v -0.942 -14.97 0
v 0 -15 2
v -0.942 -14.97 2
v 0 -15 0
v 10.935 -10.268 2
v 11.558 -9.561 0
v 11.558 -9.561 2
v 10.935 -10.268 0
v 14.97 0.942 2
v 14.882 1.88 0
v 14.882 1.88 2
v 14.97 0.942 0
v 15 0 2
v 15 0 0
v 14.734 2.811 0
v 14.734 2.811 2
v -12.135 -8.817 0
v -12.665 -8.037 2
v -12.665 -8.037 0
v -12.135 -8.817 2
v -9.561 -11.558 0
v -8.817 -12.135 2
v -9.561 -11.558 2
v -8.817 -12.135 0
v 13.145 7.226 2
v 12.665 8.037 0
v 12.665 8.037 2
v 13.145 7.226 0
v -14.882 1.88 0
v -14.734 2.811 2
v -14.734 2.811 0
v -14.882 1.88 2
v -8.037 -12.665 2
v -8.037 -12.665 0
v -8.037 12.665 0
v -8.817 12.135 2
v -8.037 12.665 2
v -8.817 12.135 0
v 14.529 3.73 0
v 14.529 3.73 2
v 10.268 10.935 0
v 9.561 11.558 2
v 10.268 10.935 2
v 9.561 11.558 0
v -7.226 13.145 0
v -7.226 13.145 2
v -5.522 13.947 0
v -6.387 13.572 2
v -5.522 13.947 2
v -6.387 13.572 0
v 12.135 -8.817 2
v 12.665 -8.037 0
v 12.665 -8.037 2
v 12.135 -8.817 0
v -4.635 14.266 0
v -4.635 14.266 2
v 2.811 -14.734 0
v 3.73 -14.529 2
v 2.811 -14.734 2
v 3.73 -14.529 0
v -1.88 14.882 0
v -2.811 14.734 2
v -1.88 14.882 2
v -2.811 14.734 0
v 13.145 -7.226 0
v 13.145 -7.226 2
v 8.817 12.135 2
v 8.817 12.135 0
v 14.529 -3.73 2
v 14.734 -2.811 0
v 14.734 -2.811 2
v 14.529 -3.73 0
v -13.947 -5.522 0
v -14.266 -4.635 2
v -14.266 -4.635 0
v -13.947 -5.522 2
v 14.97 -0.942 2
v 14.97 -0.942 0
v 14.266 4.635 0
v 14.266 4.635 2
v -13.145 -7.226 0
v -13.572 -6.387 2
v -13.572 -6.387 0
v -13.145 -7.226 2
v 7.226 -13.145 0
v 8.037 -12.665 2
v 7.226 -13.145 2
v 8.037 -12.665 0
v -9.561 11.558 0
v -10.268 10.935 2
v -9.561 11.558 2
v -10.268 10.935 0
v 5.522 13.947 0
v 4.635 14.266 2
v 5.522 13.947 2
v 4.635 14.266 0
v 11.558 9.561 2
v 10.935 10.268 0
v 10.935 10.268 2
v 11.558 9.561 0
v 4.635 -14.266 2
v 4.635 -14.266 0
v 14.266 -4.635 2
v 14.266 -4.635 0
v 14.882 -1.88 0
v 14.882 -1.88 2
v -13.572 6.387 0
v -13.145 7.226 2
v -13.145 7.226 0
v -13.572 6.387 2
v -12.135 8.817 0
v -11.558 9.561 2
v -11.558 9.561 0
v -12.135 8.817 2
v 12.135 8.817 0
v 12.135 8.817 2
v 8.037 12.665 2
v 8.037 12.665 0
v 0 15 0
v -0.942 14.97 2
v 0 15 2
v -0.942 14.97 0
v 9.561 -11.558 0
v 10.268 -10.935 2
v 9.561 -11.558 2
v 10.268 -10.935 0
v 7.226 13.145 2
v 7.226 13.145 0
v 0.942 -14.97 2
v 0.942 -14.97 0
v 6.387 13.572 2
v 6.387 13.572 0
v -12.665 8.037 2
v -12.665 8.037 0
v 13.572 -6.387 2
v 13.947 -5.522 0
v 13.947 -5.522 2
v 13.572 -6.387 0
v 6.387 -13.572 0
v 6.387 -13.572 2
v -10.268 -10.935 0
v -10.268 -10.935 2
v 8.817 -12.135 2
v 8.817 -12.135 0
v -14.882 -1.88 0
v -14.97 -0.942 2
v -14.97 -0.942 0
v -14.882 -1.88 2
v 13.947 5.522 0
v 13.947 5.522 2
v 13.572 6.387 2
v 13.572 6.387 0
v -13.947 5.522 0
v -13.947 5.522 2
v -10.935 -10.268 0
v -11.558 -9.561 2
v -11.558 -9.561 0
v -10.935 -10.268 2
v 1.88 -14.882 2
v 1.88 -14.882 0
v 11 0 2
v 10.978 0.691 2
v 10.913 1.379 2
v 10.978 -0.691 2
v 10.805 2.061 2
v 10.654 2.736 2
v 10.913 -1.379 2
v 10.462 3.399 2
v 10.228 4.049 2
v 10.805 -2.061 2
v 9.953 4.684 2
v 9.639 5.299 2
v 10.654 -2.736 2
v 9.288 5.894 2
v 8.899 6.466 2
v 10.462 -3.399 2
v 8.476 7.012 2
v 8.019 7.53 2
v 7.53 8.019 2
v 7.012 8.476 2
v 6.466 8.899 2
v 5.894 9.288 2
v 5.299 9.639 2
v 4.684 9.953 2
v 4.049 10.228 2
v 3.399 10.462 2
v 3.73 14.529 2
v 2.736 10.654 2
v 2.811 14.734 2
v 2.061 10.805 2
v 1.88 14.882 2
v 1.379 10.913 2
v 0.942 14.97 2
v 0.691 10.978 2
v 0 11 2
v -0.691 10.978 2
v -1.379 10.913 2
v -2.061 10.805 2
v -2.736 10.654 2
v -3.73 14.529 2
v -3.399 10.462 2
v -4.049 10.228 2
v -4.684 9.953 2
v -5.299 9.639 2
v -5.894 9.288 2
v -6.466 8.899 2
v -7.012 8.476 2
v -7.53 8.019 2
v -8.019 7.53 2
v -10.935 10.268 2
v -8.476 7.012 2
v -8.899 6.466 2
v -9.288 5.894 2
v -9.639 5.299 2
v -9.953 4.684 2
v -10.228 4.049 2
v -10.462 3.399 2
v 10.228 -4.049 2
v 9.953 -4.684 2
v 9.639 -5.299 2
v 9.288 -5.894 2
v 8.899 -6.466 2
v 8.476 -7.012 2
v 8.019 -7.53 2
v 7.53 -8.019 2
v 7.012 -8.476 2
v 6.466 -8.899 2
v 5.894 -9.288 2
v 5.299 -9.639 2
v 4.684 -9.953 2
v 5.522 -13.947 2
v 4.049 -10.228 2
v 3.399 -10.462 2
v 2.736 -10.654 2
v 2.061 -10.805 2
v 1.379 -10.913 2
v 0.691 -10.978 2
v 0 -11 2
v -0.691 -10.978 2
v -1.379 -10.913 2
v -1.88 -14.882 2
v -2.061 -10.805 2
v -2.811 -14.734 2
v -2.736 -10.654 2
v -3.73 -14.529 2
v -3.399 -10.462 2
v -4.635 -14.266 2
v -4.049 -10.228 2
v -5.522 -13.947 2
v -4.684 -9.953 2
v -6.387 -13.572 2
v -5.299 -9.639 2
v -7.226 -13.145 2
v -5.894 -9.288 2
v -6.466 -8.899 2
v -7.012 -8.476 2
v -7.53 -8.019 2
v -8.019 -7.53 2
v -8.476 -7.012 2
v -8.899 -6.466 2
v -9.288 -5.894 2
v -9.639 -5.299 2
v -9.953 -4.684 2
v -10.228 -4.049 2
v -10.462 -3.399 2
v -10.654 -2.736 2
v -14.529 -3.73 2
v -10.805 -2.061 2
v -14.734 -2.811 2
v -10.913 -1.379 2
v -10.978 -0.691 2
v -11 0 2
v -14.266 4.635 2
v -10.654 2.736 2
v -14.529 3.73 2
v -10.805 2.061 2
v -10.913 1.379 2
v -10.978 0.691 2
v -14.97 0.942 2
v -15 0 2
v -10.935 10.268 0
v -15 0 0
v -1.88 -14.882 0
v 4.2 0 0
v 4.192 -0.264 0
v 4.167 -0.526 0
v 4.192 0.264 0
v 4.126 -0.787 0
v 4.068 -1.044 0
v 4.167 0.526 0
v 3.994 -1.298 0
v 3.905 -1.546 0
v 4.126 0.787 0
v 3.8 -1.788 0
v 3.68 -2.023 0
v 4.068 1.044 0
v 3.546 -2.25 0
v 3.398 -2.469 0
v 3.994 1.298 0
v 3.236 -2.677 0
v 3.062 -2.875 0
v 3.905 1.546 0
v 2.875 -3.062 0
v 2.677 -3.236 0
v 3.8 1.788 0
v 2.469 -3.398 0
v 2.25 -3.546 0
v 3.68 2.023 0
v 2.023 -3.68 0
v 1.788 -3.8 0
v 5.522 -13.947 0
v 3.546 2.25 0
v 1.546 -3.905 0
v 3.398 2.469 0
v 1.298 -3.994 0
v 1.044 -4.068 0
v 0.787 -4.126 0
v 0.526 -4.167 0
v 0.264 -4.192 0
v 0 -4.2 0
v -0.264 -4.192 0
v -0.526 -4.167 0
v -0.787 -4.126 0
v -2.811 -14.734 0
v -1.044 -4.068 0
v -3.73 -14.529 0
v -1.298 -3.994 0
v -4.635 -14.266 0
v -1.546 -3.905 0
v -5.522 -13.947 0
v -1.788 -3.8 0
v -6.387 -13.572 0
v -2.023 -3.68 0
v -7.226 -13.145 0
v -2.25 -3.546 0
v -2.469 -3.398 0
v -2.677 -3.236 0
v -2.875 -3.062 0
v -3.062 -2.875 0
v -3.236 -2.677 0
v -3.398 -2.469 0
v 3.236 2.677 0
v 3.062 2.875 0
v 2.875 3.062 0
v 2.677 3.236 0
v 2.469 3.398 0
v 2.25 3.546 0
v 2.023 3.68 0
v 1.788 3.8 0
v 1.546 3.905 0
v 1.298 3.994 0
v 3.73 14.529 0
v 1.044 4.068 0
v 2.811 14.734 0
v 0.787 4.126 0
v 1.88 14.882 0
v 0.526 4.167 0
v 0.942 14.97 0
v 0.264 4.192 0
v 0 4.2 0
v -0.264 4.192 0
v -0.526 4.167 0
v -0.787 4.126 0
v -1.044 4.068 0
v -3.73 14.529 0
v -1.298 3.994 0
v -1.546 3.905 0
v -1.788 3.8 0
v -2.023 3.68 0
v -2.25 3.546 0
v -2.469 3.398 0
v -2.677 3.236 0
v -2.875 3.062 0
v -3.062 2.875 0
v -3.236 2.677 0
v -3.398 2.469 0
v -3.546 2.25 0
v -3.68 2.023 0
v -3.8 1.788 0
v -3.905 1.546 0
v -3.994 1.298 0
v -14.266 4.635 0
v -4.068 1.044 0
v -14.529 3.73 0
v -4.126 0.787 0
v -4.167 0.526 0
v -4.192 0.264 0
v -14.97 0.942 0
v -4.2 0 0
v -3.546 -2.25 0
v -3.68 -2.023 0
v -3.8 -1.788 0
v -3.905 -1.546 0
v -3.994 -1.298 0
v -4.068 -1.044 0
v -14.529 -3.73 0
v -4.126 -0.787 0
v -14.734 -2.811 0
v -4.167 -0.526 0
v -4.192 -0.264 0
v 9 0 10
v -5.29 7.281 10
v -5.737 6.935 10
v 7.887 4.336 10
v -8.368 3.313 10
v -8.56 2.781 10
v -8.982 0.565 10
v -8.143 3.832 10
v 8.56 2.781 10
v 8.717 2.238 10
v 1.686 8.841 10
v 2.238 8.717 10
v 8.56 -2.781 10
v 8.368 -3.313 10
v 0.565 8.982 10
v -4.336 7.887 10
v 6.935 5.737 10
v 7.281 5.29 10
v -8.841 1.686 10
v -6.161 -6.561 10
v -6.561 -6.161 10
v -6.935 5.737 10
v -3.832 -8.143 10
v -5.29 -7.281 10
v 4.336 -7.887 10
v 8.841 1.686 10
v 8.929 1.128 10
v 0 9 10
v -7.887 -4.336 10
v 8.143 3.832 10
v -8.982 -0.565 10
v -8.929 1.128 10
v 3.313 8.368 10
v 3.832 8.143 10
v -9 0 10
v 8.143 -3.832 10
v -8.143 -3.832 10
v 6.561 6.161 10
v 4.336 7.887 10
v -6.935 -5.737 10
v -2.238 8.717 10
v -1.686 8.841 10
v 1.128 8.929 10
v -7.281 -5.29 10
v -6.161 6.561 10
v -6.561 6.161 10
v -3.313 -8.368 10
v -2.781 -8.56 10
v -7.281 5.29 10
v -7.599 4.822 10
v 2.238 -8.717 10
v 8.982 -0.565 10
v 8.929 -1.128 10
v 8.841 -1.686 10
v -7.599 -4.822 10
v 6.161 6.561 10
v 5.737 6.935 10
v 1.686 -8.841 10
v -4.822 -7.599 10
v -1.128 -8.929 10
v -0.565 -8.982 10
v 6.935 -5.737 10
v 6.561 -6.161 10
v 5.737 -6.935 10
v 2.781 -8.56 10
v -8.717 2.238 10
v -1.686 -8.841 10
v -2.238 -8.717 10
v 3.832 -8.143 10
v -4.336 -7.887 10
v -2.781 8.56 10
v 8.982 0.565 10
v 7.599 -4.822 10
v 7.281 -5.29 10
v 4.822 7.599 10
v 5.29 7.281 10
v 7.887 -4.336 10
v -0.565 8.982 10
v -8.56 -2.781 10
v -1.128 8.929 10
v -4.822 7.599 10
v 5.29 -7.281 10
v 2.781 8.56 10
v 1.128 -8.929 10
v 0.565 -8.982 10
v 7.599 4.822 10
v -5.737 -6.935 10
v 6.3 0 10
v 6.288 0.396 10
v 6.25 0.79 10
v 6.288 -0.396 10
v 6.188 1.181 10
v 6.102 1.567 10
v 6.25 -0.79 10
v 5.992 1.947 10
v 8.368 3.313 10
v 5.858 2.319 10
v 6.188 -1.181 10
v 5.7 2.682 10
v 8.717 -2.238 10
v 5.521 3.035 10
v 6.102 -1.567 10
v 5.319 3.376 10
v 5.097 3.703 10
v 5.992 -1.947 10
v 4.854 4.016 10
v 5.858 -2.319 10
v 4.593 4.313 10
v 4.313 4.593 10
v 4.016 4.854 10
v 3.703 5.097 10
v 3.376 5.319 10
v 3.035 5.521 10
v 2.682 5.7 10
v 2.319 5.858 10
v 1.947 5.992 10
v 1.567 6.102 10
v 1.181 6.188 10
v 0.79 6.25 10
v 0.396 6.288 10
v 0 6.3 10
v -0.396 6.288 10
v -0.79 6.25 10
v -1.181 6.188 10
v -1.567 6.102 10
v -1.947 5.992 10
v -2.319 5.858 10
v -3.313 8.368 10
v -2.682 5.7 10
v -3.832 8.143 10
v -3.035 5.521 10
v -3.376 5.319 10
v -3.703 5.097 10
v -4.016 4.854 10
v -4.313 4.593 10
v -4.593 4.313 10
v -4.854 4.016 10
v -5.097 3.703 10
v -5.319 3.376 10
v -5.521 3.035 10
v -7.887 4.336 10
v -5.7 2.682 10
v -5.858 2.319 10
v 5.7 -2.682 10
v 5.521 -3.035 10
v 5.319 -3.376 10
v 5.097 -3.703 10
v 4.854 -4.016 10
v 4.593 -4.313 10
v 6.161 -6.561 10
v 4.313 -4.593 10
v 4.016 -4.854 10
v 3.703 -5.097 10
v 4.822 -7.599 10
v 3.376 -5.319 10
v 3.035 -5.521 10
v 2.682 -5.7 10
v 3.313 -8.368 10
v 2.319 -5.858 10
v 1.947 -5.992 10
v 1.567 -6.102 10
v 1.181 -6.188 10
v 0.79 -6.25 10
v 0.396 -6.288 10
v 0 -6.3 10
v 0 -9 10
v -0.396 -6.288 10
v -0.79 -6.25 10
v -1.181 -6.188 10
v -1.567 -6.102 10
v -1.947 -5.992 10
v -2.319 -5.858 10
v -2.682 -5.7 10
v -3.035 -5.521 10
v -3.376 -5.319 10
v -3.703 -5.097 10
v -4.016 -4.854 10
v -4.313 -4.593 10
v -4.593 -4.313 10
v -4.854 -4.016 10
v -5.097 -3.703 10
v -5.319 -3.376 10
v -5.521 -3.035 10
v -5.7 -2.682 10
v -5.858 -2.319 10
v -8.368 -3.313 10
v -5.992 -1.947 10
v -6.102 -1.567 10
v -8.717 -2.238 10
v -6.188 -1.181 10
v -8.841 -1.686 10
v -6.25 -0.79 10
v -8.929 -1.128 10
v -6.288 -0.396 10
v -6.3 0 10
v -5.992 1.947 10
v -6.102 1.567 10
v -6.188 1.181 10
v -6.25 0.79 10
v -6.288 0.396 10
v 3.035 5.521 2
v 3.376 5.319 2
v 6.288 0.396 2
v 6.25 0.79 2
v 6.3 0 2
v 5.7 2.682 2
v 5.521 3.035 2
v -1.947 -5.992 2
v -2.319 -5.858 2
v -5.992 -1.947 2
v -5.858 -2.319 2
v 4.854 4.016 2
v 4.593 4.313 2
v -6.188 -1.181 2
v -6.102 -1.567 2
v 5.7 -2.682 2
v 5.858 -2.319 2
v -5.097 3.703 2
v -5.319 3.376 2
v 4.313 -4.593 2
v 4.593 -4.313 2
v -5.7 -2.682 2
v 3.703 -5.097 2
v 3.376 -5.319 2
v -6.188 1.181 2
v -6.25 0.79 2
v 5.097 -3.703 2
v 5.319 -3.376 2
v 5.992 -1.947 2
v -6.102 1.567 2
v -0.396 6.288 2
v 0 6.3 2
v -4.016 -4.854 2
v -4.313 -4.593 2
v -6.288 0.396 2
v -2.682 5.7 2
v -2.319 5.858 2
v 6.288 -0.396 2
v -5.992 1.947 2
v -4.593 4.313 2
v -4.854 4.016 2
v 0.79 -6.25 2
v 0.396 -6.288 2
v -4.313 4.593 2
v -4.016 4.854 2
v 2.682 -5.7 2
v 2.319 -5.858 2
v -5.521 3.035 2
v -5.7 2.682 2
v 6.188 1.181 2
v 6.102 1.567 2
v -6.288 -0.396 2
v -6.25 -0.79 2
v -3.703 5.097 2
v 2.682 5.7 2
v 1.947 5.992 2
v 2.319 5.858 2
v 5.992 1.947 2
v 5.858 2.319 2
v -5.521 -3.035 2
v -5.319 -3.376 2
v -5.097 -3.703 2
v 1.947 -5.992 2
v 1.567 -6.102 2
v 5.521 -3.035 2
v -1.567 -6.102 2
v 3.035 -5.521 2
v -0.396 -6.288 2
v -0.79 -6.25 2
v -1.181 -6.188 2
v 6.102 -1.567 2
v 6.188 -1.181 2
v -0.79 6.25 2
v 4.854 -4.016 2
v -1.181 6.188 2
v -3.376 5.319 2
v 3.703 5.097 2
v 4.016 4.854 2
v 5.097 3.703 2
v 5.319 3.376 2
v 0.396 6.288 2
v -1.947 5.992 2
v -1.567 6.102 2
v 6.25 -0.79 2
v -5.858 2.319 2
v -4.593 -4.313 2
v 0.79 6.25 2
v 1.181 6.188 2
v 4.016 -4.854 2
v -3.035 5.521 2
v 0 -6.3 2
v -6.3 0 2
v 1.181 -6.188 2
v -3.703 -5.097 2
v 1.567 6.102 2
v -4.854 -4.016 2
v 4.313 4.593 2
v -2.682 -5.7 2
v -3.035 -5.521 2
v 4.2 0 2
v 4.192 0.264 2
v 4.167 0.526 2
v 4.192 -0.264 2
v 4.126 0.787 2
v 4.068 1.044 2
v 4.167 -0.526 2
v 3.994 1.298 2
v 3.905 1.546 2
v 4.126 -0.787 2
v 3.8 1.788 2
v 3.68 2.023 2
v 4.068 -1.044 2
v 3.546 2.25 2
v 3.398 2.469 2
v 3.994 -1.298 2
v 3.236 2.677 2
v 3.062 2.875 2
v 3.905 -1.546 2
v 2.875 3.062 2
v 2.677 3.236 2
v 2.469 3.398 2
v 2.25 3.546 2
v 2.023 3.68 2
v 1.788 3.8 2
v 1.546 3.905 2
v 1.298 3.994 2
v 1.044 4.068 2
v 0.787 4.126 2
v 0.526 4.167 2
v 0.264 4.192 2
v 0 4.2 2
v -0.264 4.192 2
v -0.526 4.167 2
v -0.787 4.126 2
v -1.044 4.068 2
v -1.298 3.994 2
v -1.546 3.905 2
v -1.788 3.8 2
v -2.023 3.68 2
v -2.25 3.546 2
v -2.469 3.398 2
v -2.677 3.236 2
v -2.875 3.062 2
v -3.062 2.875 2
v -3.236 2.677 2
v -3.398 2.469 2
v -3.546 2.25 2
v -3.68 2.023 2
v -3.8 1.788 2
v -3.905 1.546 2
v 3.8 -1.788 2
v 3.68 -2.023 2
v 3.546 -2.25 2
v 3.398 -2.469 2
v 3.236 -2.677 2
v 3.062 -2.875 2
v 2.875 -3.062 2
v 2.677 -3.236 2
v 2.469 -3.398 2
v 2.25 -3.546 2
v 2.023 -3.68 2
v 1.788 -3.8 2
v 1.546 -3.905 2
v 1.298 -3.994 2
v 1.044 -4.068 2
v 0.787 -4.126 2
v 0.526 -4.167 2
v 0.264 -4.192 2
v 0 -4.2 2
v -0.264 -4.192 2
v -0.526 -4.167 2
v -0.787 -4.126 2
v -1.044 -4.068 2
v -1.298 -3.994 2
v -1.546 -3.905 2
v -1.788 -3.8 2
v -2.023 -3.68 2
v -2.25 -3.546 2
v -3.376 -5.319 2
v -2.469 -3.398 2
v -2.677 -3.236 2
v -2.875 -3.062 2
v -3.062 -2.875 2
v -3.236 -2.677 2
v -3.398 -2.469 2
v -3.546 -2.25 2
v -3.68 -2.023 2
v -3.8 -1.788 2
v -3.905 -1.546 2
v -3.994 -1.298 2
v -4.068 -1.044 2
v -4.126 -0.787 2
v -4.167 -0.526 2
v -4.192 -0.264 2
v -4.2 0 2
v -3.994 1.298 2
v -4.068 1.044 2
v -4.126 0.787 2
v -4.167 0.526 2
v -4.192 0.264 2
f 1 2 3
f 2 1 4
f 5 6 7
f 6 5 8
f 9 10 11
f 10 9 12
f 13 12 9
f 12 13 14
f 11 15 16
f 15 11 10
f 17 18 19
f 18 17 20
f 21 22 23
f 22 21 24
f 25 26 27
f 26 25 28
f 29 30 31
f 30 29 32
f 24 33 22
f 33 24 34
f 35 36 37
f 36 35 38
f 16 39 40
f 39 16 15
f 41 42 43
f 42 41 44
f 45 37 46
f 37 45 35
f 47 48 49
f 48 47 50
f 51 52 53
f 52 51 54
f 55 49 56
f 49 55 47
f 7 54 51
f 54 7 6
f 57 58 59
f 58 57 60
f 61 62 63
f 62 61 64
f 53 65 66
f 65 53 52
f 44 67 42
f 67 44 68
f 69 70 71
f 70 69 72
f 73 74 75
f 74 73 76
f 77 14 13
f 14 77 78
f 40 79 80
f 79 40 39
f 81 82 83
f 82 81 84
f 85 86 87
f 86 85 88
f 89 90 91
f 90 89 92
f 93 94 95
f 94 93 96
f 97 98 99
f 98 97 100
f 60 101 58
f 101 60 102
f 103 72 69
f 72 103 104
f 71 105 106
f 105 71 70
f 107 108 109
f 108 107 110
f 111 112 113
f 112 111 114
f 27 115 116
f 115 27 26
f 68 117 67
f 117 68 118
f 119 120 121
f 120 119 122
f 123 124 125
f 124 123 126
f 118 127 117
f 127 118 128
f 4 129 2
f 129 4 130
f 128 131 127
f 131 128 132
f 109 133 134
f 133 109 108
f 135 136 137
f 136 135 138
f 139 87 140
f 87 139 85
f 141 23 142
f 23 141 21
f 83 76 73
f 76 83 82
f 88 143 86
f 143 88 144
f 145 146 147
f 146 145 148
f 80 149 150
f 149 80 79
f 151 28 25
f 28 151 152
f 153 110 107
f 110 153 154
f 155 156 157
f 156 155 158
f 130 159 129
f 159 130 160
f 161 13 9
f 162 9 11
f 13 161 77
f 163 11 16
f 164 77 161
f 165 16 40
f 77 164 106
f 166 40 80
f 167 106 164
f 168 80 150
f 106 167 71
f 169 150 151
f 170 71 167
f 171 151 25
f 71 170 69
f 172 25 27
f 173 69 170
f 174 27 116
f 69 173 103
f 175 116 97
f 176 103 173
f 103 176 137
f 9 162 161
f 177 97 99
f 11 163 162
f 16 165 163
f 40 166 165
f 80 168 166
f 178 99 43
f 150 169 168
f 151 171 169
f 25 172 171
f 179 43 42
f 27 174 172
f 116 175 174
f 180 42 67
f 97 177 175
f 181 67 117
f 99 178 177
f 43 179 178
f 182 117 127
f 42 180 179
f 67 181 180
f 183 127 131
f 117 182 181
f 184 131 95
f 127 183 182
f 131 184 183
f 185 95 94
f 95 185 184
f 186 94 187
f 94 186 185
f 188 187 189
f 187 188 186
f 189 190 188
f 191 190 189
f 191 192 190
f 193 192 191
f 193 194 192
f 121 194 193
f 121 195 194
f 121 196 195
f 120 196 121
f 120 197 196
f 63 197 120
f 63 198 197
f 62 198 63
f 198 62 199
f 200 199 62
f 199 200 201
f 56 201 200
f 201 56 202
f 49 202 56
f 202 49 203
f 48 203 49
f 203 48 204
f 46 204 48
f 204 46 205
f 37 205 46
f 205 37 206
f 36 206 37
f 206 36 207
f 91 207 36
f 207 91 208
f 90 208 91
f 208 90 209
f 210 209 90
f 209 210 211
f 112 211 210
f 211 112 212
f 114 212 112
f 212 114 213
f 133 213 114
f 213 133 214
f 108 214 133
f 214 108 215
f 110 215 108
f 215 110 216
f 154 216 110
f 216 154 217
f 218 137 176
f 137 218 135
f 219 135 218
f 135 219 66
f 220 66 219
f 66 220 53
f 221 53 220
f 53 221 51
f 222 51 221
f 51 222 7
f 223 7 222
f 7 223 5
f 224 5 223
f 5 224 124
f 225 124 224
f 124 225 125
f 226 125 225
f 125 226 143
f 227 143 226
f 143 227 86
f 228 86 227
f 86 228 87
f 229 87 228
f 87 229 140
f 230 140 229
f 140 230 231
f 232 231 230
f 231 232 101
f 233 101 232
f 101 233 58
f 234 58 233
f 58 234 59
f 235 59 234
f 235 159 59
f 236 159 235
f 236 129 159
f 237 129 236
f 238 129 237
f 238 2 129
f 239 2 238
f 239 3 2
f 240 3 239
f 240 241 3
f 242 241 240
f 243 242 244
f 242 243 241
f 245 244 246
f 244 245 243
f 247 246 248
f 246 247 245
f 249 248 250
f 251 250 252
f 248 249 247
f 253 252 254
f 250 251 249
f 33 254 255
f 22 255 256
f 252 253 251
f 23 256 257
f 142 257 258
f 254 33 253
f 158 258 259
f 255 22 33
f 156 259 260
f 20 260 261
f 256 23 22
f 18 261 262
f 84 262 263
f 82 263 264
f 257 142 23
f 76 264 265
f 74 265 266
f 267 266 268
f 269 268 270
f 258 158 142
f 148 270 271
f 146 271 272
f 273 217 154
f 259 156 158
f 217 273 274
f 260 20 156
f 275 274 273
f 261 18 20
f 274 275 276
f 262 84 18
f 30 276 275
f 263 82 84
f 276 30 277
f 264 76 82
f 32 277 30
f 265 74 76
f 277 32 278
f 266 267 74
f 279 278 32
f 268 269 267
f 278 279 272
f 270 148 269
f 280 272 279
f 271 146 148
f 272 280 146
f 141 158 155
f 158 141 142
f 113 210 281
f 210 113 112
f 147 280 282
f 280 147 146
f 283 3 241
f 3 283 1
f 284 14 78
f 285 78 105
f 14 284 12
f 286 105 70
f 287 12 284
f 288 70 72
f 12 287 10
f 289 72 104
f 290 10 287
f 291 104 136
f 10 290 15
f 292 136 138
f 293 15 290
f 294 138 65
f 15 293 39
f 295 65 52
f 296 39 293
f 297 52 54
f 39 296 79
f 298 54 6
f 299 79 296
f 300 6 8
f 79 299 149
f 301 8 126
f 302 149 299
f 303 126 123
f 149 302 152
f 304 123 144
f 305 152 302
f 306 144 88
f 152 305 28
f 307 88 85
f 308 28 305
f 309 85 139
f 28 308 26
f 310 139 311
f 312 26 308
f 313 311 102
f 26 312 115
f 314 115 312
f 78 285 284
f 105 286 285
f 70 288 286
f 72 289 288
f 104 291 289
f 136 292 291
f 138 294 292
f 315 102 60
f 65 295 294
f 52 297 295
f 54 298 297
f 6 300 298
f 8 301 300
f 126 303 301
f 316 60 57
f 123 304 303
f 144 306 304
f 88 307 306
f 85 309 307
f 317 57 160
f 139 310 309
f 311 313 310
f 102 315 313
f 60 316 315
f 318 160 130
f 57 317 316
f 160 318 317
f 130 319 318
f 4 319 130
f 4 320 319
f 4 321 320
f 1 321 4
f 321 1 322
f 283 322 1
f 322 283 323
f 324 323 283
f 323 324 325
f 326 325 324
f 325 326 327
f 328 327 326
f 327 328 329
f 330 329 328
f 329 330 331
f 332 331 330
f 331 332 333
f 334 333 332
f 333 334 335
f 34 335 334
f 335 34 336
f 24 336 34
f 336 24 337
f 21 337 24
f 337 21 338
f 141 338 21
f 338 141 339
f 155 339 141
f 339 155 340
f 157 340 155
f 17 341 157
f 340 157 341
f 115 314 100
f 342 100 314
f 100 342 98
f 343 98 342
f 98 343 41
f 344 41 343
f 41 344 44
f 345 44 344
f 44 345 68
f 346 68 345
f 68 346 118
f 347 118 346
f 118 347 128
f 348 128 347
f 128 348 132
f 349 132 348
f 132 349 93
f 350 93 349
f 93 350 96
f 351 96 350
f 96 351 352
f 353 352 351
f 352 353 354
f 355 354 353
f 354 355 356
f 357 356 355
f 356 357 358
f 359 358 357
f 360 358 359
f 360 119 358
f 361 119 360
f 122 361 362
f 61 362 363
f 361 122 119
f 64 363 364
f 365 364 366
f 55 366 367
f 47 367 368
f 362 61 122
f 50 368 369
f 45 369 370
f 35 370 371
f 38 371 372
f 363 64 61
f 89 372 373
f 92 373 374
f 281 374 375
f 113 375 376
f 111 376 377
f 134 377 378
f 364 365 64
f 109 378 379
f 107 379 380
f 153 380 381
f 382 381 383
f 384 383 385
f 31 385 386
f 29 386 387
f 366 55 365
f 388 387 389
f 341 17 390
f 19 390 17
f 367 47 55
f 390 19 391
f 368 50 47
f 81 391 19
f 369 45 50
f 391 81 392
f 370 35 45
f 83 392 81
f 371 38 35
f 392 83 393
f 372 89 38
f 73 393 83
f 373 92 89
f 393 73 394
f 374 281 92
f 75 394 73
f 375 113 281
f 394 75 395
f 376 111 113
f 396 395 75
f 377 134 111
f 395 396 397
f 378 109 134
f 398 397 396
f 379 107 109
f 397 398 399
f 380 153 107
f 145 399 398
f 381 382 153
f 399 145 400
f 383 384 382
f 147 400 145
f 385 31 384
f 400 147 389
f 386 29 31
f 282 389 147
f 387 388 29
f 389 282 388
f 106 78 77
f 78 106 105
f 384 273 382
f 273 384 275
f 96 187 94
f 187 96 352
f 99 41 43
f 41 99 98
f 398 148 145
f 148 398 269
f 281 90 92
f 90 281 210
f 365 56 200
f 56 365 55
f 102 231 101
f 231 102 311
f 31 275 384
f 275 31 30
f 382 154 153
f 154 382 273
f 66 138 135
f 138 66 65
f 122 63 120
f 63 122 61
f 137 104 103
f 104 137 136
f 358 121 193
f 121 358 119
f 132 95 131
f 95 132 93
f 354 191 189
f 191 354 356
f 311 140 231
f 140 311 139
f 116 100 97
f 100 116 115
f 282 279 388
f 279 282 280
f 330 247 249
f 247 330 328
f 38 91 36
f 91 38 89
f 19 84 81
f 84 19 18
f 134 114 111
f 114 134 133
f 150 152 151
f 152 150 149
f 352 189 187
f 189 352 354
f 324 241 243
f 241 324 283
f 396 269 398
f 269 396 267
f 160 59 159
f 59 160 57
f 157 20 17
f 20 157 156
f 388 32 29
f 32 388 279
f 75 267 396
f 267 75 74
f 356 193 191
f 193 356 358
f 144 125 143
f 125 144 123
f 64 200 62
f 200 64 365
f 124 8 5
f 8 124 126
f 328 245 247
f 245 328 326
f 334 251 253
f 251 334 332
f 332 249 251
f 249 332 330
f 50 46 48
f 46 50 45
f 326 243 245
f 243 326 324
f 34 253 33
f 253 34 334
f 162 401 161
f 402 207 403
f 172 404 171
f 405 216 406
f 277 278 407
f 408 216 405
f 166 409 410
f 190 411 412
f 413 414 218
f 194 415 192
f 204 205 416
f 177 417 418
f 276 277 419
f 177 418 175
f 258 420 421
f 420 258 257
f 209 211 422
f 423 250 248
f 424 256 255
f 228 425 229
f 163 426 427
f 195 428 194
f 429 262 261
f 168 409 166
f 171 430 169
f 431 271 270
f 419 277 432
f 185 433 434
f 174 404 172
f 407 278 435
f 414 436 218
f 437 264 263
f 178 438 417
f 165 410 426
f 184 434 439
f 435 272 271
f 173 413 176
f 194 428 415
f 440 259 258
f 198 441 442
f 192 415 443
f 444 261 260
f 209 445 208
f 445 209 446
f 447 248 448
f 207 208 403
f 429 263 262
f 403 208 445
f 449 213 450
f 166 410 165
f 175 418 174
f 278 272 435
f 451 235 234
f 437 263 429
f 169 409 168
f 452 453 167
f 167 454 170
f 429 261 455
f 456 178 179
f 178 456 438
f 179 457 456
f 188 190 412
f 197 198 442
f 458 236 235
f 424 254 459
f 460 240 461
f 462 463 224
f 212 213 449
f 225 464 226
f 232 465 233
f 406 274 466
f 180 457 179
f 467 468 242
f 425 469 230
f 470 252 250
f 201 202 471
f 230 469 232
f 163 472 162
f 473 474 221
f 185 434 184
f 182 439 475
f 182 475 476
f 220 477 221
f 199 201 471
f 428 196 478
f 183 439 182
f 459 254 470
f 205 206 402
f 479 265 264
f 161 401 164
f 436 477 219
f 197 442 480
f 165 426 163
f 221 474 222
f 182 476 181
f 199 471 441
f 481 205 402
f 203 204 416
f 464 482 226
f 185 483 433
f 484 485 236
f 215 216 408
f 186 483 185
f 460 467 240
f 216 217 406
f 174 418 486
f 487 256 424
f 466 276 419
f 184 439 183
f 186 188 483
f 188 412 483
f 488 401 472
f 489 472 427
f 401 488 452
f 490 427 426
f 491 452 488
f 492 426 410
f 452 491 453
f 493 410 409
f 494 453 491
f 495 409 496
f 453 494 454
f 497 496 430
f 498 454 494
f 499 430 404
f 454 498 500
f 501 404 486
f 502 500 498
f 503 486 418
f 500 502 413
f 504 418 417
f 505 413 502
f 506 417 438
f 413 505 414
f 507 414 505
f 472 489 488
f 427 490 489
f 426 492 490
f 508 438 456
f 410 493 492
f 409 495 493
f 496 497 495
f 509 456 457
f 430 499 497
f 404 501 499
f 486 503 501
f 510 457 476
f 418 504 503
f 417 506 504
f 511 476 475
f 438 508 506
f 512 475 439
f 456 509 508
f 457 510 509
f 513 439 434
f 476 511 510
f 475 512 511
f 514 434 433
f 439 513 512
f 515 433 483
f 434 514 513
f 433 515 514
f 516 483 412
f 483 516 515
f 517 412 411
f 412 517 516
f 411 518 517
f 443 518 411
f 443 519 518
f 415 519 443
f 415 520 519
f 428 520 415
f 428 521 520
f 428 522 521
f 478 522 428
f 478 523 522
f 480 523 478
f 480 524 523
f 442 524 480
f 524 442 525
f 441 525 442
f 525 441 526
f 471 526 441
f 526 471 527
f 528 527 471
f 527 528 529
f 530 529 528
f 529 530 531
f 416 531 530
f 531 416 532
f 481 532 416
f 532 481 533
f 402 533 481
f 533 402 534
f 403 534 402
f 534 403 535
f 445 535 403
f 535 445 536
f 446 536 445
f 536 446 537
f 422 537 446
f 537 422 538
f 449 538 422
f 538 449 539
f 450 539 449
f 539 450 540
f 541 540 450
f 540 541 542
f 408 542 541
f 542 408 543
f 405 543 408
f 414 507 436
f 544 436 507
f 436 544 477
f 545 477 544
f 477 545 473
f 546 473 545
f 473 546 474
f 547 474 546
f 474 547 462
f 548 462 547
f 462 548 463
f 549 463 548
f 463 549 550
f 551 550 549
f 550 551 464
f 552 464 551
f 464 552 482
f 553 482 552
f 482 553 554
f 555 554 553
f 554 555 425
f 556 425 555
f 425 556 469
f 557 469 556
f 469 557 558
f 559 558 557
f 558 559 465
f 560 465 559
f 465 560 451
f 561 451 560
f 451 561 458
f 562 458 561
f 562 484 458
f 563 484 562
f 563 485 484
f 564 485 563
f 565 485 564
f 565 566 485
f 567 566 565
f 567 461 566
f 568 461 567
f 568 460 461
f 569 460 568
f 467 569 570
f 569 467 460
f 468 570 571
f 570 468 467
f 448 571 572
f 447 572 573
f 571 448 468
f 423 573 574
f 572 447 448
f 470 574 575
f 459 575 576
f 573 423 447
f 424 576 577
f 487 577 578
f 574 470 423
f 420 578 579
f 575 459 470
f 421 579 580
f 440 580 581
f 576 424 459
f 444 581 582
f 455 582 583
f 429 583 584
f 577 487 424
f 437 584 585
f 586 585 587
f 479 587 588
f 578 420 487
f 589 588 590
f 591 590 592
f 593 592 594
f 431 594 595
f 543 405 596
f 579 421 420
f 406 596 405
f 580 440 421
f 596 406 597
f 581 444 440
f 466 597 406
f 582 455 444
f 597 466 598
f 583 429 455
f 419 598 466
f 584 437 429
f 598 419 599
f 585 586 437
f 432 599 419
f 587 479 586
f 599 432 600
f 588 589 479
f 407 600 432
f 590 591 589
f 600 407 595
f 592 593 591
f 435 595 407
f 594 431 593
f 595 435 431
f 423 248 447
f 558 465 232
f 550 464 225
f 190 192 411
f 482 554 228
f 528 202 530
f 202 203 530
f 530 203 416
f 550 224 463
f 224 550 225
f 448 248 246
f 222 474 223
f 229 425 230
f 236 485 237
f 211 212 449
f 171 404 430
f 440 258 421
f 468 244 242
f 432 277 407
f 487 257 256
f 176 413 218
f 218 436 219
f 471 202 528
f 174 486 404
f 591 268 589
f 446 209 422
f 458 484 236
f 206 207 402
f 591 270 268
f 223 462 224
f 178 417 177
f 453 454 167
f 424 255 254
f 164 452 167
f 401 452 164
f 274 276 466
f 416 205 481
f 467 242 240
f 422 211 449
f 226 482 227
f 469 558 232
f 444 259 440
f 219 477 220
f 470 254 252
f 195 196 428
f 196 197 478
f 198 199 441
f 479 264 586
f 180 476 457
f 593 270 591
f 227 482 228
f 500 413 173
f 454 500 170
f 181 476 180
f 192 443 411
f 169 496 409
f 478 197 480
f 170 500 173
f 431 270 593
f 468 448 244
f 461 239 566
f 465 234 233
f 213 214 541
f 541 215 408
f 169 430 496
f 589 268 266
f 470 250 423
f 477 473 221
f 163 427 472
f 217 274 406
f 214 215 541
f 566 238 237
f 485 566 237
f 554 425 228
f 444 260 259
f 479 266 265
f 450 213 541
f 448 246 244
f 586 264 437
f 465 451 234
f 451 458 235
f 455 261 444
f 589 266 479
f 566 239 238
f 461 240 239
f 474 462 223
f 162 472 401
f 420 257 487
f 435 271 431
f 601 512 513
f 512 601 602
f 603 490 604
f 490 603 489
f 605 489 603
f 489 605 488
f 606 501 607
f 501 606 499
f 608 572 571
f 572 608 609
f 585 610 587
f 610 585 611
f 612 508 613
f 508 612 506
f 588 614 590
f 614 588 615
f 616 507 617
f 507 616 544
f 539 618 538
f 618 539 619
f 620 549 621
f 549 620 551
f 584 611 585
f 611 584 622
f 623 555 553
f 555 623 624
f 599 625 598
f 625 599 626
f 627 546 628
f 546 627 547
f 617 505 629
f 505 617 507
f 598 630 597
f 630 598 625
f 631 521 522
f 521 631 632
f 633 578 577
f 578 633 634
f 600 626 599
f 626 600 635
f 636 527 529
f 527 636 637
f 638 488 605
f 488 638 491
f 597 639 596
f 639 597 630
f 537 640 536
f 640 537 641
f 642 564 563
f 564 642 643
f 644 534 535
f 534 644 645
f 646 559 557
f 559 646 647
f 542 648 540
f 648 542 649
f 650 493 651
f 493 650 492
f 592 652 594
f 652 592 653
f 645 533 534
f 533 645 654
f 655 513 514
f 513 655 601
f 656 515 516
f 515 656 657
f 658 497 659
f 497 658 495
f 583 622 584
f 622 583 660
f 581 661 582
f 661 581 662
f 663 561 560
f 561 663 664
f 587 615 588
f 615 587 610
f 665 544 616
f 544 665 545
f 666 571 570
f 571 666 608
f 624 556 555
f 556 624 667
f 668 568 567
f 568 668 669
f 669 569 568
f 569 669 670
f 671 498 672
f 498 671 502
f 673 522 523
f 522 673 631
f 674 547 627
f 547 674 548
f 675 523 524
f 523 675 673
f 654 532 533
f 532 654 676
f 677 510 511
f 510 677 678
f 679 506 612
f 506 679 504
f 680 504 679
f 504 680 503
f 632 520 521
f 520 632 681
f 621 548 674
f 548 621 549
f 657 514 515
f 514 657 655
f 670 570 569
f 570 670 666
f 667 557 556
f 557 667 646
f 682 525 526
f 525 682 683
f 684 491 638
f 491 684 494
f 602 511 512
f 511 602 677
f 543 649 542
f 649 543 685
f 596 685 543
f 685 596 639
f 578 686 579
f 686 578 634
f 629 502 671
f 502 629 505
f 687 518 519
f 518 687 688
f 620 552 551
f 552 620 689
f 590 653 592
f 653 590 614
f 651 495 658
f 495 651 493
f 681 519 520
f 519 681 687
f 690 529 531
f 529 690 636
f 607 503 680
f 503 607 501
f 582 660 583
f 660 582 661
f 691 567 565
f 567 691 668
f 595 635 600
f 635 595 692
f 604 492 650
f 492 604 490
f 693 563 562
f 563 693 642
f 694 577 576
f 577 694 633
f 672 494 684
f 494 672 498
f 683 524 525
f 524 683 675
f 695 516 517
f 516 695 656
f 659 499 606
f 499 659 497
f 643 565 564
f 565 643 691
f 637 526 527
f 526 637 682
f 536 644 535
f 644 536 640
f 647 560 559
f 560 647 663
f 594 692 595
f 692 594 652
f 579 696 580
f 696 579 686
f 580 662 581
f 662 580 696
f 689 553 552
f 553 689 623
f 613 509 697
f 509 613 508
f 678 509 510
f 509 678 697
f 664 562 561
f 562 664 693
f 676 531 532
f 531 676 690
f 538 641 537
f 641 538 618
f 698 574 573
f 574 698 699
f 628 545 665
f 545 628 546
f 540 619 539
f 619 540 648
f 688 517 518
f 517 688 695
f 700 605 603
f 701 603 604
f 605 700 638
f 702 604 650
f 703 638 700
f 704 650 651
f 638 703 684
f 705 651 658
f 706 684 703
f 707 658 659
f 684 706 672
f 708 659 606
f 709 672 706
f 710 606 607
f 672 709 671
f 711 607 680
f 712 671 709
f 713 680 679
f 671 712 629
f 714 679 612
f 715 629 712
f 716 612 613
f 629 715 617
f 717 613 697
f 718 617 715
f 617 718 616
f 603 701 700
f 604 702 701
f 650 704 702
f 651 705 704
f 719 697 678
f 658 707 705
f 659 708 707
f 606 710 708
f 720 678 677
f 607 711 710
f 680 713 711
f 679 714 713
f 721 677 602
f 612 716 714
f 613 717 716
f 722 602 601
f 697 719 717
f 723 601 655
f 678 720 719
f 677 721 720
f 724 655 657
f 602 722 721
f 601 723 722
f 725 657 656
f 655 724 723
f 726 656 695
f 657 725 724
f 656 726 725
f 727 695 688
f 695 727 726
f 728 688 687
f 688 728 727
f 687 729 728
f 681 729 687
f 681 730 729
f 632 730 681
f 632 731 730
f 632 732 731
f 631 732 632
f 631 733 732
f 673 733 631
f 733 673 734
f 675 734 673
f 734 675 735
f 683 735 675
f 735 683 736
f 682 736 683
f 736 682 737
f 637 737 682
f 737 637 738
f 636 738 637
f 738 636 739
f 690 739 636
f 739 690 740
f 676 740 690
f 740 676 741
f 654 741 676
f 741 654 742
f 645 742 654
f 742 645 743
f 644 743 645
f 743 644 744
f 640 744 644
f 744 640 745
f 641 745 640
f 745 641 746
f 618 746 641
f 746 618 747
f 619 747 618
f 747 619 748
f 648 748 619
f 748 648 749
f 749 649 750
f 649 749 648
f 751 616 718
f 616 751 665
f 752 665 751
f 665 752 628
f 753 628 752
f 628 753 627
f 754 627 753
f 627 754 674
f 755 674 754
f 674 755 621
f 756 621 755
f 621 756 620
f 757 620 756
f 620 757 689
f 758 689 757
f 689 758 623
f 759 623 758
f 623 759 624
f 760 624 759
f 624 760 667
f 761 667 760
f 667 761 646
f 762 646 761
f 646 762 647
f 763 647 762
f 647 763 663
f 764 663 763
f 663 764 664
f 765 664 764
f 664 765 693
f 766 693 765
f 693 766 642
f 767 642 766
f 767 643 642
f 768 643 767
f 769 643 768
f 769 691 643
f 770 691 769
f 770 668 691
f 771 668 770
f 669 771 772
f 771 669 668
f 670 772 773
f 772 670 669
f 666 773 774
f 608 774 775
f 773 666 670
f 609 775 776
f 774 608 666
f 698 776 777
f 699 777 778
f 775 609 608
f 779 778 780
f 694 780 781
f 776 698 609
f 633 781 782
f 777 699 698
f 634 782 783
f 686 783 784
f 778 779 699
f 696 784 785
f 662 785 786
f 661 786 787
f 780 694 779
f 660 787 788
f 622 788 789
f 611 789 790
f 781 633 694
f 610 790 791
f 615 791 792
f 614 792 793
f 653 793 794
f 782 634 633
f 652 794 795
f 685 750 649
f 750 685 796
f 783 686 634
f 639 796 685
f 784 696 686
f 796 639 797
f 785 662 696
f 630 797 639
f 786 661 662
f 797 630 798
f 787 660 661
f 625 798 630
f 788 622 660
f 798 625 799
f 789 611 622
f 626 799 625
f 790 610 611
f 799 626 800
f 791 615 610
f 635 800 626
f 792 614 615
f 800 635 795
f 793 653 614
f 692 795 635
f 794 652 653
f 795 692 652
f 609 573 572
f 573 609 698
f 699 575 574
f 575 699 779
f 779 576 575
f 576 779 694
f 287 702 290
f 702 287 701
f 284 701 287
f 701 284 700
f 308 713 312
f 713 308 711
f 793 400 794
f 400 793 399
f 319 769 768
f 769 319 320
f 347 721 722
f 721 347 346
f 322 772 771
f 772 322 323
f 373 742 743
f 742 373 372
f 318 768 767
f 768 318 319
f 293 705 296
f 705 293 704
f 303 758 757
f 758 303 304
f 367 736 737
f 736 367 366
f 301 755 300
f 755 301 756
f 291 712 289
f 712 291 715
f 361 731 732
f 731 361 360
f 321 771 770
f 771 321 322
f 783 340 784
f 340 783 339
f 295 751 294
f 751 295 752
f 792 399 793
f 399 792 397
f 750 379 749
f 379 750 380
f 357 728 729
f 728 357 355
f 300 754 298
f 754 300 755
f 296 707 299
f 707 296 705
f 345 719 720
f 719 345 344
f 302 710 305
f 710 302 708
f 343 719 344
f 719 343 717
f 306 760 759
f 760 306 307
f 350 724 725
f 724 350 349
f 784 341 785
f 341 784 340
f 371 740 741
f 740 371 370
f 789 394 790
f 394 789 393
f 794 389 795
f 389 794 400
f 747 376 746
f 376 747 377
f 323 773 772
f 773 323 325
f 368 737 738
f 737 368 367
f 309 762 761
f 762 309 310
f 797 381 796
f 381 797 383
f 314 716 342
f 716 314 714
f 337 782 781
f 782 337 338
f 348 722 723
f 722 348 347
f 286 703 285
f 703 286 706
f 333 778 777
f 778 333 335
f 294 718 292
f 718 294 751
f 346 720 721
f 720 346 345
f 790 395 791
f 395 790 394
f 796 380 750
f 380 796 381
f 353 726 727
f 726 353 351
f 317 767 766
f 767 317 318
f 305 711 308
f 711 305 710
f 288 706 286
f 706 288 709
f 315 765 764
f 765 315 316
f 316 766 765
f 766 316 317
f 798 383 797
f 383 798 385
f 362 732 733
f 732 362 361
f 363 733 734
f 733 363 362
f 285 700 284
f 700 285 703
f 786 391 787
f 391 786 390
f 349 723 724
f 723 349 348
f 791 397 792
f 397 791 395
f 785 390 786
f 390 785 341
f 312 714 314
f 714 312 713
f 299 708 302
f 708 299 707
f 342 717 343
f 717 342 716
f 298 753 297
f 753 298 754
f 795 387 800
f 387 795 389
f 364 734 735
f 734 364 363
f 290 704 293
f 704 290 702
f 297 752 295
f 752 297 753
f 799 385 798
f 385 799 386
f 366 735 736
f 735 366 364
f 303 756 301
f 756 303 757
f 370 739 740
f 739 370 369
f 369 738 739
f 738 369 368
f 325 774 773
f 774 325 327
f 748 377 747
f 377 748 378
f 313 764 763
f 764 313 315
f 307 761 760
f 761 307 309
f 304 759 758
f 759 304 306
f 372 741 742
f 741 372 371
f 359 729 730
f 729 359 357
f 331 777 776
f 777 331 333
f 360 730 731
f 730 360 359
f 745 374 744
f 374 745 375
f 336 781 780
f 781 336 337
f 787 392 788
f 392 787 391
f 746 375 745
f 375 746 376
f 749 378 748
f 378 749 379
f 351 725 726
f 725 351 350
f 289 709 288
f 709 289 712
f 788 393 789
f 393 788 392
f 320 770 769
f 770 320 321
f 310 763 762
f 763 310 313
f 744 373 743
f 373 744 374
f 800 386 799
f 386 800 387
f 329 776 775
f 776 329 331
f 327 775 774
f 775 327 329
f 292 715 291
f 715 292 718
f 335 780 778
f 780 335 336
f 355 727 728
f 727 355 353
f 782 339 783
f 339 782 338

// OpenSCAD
r_int=28/2;
r_ext=38/2;
h1=2; 
h2=8;

module support_bobine(){
	difference(){
		union(){
			cylinder(h=h1, r=15, $fn=100);
			translate([0,0,h1]){cylinder(h=h2, r1=11, r2=9, $fn=100);}
		}

			translate([0,0,h1]){cylinder(h=h2+5, r=6.3, $fn=100);}

			translate([0,0,-5]){cylinder(h=h2+10, r=4.2, $fn=100);}
	}

}

support_bobine();
